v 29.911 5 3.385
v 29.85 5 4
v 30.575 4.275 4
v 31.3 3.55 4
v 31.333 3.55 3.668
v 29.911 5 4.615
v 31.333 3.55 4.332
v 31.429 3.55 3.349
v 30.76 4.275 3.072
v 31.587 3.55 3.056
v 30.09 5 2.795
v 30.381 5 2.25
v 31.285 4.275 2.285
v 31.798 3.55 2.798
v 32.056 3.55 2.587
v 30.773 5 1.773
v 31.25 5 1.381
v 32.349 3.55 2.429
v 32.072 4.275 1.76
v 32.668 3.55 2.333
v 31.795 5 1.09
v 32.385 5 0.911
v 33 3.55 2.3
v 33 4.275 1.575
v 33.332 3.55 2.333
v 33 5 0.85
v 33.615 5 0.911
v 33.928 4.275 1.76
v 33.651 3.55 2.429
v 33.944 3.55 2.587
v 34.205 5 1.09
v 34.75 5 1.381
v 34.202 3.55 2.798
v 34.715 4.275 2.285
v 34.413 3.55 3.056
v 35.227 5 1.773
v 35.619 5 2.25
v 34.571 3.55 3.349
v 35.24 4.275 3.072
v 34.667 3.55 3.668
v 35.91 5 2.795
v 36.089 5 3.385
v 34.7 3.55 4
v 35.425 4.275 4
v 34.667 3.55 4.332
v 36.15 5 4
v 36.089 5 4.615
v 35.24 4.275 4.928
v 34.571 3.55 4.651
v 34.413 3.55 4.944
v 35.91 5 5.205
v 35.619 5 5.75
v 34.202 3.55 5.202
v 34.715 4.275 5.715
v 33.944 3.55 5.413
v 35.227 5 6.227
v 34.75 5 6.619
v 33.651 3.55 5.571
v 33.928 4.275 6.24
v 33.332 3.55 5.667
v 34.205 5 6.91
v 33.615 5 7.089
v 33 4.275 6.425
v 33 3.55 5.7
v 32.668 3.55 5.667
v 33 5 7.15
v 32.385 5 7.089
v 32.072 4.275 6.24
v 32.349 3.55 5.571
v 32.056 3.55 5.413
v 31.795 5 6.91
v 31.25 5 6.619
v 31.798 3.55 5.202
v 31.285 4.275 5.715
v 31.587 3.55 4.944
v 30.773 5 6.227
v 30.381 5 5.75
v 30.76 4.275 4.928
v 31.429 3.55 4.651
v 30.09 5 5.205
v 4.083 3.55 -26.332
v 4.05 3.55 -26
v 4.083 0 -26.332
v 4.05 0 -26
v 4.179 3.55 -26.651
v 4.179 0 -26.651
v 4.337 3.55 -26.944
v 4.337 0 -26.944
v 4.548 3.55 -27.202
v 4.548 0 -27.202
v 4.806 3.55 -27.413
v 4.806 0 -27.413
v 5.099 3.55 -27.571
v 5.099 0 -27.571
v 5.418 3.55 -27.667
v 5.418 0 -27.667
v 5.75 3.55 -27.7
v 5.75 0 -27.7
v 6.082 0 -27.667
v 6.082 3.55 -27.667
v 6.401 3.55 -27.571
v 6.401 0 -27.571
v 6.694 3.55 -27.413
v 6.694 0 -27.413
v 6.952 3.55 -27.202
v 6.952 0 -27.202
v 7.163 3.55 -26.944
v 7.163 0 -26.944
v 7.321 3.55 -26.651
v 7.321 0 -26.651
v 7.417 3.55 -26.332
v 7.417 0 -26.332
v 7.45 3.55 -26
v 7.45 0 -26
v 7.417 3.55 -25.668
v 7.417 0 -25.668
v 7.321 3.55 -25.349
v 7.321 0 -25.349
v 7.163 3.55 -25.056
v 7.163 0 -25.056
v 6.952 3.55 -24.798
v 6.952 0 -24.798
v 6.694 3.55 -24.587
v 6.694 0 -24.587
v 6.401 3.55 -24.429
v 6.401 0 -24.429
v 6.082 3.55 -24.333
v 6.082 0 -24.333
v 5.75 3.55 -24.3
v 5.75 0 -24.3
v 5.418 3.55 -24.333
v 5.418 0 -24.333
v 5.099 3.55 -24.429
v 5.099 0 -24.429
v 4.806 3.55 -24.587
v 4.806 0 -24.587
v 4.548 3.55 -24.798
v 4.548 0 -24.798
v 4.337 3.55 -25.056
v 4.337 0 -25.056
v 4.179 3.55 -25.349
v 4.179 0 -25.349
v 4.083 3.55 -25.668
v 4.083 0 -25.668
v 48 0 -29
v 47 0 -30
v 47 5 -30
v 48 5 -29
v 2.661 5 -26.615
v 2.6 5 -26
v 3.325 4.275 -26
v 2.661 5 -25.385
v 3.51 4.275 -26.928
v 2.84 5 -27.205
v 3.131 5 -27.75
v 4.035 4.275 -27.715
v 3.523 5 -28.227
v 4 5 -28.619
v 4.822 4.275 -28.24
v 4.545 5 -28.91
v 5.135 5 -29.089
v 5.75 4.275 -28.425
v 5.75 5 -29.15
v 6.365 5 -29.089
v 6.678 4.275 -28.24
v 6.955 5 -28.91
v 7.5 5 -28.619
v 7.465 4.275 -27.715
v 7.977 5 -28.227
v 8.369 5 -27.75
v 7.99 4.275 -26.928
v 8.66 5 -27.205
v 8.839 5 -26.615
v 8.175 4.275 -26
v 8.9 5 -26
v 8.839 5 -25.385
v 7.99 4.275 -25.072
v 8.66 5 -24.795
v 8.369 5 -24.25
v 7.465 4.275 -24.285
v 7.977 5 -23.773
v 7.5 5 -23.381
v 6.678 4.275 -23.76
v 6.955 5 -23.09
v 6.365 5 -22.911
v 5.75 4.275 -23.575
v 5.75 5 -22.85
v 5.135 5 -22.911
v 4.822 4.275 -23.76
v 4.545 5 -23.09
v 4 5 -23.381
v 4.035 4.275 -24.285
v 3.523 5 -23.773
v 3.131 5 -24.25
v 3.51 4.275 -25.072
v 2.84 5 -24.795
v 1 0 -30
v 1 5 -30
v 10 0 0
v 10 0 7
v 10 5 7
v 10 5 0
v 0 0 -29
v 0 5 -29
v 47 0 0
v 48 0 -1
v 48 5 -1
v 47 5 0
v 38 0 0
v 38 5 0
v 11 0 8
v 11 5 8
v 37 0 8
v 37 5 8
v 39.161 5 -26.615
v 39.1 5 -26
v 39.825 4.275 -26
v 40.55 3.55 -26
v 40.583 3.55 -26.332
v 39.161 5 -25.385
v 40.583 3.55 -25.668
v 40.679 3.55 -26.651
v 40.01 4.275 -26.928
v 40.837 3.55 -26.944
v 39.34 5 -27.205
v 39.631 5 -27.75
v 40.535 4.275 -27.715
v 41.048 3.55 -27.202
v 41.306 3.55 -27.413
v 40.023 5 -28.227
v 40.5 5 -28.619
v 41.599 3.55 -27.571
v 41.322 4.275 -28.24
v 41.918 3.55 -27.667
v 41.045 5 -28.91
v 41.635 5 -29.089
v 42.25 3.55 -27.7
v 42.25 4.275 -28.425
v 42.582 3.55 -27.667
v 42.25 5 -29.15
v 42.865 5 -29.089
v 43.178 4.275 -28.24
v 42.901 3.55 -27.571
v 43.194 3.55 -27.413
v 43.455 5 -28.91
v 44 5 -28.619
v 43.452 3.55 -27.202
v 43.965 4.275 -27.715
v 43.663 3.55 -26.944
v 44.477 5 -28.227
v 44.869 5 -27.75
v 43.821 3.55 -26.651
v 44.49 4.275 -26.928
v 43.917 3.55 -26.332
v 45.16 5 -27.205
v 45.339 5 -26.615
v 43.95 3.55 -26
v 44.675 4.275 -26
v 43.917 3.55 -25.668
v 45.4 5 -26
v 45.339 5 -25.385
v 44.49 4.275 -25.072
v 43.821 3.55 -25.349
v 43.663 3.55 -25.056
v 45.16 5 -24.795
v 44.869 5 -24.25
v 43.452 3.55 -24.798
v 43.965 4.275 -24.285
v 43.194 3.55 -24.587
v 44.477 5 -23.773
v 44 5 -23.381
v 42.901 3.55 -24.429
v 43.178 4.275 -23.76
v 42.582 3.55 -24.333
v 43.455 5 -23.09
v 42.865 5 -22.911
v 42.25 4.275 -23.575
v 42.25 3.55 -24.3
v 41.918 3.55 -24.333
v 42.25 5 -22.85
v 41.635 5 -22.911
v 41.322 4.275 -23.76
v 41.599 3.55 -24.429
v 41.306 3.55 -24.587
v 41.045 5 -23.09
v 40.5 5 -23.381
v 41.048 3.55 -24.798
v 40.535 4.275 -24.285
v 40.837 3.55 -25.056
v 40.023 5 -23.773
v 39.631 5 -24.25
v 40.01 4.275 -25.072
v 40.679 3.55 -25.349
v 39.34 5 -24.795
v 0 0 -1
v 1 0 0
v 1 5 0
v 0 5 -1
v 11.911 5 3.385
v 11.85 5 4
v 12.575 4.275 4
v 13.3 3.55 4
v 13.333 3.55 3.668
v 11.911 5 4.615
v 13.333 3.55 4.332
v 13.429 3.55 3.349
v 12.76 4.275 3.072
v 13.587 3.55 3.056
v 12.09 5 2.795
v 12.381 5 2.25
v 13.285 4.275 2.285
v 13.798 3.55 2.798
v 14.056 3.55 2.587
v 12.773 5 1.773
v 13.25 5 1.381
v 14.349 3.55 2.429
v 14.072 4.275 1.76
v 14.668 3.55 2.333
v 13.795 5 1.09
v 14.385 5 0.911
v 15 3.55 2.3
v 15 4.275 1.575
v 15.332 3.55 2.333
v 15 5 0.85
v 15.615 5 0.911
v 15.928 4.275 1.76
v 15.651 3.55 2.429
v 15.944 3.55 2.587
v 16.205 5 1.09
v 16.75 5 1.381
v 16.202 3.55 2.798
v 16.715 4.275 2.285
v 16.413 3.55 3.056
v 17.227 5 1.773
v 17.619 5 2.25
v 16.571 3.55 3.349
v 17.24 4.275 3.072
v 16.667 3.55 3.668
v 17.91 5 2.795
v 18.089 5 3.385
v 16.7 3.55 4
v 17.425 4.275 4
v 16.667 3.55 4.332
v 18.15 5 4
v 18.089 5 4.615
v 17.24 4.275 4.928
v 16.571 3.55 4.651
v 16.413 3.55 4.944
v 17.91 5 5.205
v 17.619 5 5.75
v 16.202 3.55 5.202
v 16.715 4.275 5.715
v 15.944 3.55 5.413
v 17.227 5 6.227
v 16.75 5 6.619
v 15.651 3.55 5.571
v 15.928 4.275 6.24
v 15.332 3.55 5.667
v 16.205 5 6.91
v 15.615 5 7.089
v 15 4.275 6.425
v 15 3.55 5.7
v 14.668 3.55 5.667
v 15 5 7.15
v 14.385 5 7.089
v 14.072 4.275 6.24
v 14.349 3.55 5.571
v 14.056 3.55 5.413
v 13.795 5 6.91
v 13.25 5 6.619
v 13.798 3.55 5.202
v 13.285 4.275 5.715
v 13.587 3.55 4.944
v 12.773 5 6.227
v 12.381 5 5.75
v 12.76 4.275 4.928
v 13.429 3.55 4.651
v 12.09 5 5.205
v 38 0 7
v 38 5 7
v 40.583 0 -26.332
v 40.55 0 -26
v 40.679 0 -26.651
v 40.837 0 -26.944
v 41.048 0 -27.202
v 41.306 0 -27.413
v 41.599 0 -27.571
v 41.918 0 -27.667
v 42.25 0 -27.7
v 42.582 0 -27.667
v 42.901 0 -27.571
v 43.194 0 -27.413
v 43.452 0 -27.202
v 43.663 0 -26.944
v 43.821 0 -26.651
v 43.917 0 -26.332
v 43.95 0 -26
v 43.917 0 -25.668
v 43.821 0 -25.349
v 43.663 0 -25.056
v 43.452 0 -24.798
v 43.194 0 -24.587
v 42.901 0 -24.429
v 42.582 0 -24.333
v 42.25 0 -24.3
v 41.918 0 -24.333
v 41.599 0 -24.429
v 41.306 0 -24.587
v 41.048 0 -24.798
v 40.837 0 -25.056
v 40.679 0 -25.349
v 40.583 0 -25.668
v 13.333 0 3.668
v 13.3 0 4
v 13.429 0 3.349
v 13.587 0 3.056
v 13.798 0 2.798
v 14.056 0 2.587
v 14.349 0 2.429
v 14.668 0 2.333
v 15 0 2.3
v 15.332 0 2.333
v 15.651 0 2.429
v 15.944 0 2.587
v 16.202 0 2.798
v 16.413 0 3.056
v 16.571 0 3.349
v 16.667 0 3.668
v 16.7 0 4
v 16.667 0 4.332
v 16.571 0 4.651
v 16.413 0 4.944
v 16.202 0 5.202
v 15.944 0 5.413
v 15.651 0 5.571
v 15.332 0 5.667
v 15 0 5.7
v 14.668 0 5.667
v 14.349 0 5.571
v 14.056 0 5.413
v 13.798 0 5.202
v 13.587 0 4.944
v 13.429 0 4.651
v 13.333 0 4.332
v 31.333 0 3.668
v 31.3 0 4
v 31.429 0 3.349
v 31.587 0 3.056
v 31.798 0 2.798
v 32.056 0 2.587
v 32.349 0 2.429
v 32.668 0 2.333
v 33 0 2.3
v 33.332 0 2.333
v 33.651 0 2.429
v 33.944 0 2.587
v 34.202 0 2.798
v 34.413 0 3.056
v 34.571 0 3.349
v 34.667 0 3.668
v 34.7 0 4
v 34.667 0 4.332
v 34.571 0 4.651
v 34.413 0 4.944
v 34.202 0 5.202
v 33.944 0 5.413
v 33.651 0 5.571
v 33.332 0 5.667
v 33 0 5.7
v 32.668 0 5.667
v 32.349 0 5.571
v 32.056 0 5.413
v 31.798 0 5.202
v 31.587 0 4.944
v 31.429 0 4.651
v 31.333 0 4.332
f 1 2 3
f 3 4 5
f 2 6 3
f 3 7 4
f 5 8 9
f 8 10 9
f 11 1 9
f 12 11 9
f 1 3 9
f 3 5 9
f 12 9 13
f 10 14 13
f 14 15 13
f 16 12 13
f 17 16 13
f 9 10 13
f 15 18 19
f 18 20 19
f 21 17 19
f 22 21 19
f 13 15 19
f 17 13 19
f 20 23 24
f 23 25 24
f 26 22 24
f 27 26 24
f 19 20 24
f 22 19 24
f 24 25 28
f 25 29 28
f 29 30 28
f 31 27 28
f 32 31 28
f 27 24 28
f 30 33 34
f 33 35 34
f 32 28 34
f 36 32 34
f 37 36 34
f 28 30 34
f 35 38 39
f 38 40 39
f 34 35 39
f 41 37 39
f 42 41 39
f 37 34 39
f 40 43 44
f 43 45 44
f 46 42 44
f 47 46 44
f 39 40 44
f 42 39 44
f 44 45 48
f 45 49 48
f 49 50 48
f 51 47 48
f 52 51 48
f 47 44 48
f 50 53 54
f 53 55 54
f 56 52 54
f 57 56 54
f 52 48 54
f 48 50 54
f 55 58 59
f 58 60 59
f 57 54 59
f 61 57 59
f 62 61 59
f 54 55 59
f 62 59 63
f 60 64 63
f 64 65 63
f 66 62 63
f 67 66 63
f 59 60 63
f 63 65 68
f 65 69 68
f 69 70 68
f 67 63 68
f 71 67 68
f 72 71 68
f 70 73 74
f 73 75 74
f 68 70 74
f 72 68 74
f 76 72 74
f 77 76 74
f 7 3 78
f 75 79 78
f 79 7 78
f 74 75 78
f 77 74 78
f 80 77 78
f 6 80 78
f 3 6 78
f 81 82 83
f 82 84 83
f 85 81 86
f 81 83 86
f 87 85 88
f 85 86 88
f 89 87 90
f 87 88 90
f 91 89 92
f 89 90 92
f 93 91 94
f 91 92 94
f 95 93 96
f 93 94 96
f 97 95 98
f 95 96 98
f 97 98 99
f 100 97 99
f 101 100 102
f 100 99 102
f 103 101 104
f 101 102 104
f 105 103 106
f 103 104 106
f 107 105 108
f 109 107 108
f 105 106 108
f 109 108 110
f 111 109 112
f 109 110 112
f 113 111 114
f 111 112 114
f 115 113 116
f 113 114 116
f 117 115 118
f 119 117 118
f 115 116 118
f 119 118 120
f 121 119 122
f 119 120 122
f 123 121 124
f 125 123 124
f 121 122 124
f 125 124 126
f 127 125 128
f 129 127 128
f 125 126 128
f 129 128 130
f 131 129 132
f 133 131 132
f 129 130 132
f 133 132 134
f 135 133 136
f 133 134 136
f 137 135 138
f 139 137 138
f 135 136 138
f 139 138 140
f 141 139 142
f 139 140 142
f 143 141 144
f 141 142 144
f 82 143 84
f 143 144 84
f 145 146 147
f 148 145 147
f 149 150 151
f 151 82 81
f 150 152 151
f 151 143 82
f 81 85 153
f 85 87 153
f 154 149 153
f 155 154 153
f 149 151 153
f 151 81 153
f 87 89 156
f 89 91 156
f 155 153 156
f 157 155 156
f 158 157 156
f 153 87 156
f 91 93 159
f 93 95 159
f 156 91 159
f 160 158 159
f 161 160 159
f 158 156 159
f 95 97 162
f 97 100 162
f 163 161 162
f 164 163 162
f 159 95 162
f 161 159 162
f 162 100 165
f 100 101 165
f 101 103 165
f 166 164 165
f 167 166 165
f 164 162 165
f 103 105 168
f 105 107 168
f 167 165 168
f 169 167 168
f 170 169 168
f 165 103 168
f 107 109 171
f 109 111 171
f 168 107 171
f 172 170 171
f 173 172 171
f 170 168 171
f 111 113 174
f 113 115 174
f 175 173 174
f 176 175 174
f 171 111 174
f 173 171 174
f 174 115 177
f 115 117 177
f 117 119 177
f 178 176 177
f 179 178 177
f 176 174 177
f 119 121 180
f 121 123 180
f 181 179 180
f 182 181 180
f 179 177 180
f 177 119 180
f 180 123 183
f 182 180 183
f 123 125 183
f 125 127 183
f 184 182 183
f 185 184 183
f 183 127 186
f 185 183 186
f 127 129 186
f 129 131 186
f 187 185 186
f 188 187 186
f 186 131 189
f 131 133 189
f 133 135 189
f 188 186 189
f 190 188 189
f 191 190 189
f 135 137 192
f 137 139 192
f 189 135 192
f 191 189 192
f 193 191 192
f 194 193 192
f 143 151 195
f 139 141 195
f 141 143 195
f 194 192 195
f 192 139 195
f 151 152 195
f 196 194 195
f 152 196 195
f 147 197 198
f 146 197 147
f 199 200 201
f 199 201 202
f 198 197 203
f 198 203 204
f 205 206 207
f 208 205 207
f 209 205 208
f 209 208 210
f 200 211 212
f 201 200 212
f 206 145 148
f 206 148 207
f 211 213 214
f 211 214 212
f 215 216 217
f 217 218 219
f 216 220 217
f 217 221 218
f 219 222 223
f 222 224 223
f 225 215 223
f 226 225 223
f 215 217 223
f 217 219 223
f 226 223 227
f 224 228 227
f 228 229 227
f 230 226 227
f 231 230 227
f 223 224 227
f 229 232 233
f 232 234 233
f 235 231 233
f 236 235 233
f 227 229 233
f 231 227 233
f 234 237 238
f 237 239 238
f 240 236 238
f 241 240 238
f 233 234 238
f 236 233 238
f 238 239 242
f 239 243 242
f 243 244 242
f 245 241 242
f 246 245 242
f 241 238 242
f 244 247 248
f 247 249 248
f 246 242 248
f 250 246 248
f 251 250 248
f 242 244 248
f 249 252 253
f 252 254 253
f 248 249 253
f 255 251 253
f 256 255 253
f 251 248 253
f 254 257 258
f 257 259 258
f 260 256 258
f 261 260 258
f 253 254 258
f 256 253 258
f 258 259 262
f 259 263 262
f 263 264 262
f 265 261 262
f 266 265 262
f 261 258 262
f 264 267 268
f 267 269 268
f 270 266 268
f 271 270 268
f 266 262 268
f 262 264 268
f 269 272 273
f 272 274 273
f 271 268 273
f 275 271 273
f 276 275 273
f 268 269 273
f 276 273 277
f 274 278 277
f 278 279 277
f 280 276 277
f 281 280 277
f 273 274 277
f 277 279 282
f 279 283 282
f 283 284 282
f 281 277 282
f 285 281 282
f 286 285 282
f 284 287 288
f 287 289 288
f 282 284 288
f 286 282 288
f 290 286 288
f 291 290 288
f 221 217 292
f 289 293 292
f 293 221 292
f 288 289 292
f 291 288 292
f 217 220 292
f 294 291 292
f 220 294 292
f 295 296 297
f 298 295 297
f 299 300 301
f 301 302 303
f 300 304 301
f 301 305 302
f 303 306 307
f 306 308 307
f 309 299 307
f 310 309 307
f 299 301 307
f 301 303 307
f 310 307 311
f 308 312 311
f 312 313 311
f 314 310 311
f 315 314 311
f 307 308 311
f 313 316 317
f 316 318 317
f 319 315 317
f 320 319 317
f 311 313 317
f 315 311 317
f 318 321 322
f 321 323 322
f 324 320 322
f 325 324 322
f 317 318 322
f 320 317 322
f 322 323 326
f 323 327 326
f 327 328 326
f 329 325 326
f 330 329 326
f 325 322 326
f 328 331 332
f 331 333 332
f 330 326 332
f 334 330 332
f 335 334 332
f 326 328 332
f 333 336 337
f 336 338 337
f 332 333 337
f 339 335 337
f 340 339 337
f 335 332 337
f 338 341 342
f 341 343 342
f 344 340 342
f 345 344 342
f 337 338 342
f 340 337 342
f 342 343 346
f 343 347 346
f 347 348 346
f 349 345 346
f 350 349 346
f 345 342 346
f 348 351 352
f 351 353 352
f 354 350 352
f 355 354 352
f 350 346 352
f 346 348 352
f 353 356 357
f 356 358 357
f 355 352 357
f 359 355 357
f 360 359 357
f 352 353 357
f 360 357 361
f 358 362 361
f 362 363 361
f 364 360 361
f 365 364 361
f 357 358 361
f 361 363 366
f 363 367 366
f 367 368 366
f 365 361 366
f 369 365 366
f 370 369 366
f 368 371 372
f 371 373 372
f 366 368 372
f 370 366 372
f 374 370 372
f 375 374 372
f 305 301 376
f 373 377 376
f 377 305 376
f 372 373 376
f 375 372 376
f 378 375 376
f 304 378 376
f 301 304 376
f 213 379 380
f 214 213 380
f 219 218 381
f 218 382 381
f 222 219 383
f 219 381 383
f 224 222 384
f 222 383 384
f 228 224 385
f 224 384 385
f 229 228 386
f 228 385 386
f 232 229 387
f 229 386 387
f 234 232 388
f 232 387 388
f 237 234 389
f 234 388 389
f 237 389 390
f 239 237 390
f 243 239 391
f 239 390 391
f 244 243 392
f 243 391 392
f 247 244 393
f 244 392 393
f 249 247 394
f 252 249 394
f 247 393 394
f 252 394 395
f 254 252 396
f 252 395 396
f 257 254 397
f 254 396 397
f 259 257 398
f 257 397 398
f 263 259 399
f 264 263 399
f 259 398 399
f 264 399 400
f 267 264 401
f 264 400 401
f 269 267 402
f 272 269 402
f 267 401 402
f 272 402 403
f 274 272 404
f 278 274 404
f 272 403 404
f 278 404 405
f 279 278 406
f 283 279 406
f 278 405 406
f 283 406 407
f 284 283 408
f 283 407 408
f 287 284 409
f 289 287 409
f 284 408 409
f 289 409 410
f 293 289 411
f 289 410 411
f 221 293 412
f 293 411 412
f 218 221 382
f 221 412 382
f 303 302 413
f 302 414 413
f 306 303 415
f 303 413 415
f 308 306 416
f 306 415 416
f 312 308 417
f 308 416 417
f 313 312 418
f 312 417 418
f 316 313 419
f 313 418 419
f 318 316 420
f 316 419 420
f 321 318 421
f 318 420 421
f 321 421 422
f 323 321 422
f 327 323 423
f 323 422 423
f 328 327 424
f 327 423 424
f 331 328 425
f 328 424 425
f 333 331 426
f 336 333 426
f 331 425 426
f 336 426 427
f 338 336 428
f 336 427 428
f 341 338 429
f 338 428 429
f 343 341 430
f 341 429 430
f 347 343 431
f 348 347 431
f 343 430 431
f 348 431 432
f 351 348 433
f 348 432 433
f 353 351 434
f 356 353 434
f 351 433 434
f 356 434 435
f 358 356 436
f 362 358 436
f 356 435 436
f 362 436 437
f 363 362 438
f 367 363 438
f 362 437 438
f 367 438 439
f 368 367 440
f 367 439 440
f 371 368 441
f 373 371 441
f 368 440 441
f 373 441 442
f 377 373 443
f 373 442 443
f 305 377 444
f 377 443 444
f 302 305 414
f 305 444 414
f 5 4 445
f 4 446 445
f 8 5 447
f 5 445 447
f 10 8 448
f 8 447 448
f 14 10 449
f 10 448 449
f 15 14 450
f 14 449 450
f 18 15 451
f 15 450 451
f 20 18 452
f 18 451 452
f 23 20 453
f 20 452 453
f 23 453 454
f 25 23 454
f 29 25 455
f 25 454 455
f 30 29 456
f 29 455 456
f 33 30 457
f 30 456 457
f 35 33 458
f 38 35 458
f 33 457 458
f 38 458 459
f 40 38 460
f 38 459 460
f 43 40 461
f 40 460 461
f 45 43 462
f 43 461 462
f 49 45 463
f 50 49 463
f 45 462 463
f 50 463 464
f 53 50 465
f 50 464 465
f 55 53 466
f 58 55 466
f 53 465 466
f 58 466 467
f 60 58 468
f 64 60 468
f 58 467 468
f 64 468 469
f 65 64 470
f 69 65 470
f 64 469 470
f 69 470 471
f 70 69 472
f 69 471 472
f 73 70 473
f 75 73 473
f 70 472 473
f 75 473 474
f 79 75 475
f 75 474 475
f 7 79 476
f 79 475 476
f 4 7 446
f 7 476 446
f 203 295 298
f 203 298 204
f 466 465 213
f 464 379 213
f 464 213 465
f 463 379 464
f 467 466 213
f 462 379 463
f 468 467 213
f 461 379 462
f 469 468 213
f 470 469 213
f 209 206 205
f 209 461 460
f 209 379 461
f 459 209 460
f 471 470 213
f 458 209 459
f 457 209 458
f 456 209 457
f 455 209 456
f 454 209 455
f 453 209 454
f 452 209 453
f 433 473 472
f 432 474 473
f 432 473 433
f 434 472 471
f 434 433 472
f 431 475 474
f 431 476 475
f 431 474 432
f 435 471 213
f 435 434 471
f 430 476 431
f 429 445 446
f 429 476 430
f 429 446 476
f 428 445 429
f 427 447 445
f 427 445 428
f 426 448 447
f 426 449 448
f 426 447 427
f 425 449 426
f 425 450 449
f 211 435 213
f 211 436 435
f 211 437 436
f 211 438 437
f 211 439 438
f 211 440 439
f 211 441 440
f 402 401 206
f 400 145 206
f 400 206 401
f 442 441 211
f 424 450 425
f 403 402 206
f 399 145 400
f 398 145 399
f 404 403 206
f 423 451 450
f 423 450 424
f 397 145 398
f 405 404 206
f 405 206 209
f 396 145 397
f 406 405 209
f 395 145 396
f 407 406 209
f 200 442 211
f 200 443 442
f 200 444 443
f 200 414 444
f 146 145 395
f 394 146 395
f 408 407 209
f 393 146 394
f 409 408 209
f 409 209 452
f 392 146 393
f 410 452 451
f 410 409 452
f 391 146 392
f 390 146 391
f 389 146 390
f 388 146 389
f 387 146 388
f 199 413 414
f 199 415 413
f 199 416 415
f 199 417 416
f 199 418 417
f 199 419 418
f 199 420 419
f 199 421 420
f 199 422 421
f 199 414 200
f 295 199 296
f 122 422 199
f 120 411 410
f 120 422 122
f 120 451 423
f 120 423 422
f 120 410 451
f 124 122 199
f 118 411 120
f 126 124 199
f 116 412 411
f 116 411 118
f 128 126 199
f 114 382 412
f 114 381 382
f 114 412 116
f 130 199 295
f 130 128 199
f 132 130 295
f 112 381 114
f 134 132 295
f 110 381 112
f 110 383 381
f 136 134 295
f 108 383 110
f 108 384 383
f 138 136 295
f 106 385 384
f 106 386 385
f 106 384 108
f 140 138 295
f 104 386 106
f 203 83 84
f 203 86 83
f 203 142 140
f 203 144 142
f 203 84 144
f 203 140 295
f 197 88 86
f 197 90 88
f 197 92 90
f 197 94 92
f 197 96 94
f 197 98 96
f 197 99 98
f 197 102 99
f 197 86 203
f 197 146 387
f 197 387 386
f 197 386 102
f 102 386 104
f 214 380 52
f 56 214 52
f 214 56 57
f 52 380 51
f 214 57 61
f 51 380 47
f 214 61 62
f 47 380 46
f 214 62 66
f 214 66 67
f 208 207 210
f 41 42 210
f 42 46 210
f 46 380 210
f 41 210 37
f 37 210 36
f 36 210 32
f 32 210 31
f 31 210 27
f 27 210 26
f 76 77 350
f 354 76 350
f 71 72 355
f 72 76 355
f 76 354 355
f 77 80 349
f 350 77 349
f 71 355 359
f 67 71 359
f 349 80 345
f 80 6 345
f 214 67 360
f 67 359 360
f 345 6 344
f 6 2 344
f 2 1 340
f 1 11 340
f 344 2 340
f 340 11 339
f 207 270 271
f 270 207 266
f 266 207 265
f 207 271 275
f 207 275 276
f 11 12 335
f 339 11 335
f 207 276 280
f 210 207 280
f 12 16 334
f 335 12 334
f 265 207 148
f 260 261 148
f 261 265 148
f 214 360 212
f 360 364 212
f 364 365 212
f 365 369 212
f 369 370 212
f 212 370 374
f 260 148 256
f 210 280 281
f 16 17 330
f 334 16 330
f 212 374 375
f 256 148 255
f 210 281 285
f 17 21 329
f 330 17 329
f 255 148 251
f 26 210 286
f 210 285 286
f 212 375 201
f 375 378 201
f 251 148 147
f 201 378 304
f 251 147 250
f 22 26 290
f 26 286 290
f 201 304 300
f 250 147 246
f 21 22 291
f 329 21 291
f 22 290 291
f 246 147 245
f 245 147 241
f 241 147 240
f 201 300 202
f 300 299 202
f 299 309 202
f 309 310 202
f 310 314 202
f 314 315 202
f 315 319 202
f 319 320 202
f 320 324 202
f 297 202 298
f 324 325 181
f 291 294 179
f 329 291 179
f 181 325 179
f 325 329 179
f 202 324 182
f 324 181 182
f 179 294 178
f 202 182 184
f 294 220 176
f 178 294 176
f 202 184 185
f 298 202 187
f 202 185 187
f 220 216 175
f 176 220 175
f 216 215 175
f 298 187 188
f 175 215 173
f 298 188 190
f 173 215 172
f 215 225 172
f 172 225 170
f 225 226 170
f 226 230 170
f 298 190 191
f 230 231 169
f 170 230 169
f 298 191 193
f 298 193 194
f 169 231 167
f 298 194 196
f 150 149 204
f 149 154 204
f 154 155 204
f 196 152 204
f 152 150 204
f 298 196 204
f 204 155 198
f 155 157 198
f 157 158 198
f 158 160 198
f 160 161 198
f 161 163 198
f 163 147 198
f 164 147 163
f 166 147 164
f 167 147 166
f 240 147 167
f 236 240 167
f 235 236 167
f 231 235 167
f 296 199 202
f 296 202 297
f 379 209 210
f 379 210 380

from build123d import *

# Parameters (mm, degrees)
BOSS_EXTRUDE1_DEPTH                                 = 5
CSK_FOR_M3_FLAT_COUNTERSUNK_HEAD_SCREW1_D           = 3.4
CSK_FOR_M3_FLAT_COUNTERSUNK_HEAD_SCREW1_CSINK_D     = 6.3
CSK_FOR_M3_FLAT_COUNTERSUNK_HEAD_SCREW1_CSINK_ANGLE = 90
CHAMFER1_SIZE                                       = 1


with BuildPart() as part:
    # Sketch1 → Boss-Extrude1 (new body)
    with BuildSketch(Plane(origin=(0, 0, 0), x_dir=(1, 0, 0), z_dir=(0, 1, 0))):
        Polygon((0, 0), (0, 30), (48, 30), (48, 0), (38, 0), (38, -8), (10, -8), (10, 0), align=None)
    extrude(amount=BOSS_EXTRUDE1_DEPTH)

    # CSK for M3 Flat Countersunk Head Screw1 (through all)
    with Locations(Plane(origin=(0, 5, 0), x_dir=(1, 0, 0), z_dir=(0, 1, 0))):
        with Locations((5.75, 26), (42.25, 26), (15, -4), (33, -4)):
            CounterSinkHole(CSK_FOR_M3_FLAT_COUNTERSUNK_HEAD_SCREW1_D / 2, CSK_FOR_M3_FLAT_COUNTERSUNK_HEAD_SCREW1_CSINK_D / 2, counter_sink_angle=CSK_FOR_M3_FLAT_COUNTERSUNK_HEAD_SCREW1_CSINK_ANGLE)

    # Chamfer1
    chamfer1_edges = [part.edges().sort_by_distance(p)[0] for p in [
        (0, 2.5, 0),
        (0, 2.5, -30),
        (48, 2.5, -30),
        (48, 2.5, 0),
        (38, 2.5, 8),
        (10, 2.5, 8),
    ]]
    chamfer(chamfer1_edges, length=CHAMFER1_SIZE)


solid = part.part
